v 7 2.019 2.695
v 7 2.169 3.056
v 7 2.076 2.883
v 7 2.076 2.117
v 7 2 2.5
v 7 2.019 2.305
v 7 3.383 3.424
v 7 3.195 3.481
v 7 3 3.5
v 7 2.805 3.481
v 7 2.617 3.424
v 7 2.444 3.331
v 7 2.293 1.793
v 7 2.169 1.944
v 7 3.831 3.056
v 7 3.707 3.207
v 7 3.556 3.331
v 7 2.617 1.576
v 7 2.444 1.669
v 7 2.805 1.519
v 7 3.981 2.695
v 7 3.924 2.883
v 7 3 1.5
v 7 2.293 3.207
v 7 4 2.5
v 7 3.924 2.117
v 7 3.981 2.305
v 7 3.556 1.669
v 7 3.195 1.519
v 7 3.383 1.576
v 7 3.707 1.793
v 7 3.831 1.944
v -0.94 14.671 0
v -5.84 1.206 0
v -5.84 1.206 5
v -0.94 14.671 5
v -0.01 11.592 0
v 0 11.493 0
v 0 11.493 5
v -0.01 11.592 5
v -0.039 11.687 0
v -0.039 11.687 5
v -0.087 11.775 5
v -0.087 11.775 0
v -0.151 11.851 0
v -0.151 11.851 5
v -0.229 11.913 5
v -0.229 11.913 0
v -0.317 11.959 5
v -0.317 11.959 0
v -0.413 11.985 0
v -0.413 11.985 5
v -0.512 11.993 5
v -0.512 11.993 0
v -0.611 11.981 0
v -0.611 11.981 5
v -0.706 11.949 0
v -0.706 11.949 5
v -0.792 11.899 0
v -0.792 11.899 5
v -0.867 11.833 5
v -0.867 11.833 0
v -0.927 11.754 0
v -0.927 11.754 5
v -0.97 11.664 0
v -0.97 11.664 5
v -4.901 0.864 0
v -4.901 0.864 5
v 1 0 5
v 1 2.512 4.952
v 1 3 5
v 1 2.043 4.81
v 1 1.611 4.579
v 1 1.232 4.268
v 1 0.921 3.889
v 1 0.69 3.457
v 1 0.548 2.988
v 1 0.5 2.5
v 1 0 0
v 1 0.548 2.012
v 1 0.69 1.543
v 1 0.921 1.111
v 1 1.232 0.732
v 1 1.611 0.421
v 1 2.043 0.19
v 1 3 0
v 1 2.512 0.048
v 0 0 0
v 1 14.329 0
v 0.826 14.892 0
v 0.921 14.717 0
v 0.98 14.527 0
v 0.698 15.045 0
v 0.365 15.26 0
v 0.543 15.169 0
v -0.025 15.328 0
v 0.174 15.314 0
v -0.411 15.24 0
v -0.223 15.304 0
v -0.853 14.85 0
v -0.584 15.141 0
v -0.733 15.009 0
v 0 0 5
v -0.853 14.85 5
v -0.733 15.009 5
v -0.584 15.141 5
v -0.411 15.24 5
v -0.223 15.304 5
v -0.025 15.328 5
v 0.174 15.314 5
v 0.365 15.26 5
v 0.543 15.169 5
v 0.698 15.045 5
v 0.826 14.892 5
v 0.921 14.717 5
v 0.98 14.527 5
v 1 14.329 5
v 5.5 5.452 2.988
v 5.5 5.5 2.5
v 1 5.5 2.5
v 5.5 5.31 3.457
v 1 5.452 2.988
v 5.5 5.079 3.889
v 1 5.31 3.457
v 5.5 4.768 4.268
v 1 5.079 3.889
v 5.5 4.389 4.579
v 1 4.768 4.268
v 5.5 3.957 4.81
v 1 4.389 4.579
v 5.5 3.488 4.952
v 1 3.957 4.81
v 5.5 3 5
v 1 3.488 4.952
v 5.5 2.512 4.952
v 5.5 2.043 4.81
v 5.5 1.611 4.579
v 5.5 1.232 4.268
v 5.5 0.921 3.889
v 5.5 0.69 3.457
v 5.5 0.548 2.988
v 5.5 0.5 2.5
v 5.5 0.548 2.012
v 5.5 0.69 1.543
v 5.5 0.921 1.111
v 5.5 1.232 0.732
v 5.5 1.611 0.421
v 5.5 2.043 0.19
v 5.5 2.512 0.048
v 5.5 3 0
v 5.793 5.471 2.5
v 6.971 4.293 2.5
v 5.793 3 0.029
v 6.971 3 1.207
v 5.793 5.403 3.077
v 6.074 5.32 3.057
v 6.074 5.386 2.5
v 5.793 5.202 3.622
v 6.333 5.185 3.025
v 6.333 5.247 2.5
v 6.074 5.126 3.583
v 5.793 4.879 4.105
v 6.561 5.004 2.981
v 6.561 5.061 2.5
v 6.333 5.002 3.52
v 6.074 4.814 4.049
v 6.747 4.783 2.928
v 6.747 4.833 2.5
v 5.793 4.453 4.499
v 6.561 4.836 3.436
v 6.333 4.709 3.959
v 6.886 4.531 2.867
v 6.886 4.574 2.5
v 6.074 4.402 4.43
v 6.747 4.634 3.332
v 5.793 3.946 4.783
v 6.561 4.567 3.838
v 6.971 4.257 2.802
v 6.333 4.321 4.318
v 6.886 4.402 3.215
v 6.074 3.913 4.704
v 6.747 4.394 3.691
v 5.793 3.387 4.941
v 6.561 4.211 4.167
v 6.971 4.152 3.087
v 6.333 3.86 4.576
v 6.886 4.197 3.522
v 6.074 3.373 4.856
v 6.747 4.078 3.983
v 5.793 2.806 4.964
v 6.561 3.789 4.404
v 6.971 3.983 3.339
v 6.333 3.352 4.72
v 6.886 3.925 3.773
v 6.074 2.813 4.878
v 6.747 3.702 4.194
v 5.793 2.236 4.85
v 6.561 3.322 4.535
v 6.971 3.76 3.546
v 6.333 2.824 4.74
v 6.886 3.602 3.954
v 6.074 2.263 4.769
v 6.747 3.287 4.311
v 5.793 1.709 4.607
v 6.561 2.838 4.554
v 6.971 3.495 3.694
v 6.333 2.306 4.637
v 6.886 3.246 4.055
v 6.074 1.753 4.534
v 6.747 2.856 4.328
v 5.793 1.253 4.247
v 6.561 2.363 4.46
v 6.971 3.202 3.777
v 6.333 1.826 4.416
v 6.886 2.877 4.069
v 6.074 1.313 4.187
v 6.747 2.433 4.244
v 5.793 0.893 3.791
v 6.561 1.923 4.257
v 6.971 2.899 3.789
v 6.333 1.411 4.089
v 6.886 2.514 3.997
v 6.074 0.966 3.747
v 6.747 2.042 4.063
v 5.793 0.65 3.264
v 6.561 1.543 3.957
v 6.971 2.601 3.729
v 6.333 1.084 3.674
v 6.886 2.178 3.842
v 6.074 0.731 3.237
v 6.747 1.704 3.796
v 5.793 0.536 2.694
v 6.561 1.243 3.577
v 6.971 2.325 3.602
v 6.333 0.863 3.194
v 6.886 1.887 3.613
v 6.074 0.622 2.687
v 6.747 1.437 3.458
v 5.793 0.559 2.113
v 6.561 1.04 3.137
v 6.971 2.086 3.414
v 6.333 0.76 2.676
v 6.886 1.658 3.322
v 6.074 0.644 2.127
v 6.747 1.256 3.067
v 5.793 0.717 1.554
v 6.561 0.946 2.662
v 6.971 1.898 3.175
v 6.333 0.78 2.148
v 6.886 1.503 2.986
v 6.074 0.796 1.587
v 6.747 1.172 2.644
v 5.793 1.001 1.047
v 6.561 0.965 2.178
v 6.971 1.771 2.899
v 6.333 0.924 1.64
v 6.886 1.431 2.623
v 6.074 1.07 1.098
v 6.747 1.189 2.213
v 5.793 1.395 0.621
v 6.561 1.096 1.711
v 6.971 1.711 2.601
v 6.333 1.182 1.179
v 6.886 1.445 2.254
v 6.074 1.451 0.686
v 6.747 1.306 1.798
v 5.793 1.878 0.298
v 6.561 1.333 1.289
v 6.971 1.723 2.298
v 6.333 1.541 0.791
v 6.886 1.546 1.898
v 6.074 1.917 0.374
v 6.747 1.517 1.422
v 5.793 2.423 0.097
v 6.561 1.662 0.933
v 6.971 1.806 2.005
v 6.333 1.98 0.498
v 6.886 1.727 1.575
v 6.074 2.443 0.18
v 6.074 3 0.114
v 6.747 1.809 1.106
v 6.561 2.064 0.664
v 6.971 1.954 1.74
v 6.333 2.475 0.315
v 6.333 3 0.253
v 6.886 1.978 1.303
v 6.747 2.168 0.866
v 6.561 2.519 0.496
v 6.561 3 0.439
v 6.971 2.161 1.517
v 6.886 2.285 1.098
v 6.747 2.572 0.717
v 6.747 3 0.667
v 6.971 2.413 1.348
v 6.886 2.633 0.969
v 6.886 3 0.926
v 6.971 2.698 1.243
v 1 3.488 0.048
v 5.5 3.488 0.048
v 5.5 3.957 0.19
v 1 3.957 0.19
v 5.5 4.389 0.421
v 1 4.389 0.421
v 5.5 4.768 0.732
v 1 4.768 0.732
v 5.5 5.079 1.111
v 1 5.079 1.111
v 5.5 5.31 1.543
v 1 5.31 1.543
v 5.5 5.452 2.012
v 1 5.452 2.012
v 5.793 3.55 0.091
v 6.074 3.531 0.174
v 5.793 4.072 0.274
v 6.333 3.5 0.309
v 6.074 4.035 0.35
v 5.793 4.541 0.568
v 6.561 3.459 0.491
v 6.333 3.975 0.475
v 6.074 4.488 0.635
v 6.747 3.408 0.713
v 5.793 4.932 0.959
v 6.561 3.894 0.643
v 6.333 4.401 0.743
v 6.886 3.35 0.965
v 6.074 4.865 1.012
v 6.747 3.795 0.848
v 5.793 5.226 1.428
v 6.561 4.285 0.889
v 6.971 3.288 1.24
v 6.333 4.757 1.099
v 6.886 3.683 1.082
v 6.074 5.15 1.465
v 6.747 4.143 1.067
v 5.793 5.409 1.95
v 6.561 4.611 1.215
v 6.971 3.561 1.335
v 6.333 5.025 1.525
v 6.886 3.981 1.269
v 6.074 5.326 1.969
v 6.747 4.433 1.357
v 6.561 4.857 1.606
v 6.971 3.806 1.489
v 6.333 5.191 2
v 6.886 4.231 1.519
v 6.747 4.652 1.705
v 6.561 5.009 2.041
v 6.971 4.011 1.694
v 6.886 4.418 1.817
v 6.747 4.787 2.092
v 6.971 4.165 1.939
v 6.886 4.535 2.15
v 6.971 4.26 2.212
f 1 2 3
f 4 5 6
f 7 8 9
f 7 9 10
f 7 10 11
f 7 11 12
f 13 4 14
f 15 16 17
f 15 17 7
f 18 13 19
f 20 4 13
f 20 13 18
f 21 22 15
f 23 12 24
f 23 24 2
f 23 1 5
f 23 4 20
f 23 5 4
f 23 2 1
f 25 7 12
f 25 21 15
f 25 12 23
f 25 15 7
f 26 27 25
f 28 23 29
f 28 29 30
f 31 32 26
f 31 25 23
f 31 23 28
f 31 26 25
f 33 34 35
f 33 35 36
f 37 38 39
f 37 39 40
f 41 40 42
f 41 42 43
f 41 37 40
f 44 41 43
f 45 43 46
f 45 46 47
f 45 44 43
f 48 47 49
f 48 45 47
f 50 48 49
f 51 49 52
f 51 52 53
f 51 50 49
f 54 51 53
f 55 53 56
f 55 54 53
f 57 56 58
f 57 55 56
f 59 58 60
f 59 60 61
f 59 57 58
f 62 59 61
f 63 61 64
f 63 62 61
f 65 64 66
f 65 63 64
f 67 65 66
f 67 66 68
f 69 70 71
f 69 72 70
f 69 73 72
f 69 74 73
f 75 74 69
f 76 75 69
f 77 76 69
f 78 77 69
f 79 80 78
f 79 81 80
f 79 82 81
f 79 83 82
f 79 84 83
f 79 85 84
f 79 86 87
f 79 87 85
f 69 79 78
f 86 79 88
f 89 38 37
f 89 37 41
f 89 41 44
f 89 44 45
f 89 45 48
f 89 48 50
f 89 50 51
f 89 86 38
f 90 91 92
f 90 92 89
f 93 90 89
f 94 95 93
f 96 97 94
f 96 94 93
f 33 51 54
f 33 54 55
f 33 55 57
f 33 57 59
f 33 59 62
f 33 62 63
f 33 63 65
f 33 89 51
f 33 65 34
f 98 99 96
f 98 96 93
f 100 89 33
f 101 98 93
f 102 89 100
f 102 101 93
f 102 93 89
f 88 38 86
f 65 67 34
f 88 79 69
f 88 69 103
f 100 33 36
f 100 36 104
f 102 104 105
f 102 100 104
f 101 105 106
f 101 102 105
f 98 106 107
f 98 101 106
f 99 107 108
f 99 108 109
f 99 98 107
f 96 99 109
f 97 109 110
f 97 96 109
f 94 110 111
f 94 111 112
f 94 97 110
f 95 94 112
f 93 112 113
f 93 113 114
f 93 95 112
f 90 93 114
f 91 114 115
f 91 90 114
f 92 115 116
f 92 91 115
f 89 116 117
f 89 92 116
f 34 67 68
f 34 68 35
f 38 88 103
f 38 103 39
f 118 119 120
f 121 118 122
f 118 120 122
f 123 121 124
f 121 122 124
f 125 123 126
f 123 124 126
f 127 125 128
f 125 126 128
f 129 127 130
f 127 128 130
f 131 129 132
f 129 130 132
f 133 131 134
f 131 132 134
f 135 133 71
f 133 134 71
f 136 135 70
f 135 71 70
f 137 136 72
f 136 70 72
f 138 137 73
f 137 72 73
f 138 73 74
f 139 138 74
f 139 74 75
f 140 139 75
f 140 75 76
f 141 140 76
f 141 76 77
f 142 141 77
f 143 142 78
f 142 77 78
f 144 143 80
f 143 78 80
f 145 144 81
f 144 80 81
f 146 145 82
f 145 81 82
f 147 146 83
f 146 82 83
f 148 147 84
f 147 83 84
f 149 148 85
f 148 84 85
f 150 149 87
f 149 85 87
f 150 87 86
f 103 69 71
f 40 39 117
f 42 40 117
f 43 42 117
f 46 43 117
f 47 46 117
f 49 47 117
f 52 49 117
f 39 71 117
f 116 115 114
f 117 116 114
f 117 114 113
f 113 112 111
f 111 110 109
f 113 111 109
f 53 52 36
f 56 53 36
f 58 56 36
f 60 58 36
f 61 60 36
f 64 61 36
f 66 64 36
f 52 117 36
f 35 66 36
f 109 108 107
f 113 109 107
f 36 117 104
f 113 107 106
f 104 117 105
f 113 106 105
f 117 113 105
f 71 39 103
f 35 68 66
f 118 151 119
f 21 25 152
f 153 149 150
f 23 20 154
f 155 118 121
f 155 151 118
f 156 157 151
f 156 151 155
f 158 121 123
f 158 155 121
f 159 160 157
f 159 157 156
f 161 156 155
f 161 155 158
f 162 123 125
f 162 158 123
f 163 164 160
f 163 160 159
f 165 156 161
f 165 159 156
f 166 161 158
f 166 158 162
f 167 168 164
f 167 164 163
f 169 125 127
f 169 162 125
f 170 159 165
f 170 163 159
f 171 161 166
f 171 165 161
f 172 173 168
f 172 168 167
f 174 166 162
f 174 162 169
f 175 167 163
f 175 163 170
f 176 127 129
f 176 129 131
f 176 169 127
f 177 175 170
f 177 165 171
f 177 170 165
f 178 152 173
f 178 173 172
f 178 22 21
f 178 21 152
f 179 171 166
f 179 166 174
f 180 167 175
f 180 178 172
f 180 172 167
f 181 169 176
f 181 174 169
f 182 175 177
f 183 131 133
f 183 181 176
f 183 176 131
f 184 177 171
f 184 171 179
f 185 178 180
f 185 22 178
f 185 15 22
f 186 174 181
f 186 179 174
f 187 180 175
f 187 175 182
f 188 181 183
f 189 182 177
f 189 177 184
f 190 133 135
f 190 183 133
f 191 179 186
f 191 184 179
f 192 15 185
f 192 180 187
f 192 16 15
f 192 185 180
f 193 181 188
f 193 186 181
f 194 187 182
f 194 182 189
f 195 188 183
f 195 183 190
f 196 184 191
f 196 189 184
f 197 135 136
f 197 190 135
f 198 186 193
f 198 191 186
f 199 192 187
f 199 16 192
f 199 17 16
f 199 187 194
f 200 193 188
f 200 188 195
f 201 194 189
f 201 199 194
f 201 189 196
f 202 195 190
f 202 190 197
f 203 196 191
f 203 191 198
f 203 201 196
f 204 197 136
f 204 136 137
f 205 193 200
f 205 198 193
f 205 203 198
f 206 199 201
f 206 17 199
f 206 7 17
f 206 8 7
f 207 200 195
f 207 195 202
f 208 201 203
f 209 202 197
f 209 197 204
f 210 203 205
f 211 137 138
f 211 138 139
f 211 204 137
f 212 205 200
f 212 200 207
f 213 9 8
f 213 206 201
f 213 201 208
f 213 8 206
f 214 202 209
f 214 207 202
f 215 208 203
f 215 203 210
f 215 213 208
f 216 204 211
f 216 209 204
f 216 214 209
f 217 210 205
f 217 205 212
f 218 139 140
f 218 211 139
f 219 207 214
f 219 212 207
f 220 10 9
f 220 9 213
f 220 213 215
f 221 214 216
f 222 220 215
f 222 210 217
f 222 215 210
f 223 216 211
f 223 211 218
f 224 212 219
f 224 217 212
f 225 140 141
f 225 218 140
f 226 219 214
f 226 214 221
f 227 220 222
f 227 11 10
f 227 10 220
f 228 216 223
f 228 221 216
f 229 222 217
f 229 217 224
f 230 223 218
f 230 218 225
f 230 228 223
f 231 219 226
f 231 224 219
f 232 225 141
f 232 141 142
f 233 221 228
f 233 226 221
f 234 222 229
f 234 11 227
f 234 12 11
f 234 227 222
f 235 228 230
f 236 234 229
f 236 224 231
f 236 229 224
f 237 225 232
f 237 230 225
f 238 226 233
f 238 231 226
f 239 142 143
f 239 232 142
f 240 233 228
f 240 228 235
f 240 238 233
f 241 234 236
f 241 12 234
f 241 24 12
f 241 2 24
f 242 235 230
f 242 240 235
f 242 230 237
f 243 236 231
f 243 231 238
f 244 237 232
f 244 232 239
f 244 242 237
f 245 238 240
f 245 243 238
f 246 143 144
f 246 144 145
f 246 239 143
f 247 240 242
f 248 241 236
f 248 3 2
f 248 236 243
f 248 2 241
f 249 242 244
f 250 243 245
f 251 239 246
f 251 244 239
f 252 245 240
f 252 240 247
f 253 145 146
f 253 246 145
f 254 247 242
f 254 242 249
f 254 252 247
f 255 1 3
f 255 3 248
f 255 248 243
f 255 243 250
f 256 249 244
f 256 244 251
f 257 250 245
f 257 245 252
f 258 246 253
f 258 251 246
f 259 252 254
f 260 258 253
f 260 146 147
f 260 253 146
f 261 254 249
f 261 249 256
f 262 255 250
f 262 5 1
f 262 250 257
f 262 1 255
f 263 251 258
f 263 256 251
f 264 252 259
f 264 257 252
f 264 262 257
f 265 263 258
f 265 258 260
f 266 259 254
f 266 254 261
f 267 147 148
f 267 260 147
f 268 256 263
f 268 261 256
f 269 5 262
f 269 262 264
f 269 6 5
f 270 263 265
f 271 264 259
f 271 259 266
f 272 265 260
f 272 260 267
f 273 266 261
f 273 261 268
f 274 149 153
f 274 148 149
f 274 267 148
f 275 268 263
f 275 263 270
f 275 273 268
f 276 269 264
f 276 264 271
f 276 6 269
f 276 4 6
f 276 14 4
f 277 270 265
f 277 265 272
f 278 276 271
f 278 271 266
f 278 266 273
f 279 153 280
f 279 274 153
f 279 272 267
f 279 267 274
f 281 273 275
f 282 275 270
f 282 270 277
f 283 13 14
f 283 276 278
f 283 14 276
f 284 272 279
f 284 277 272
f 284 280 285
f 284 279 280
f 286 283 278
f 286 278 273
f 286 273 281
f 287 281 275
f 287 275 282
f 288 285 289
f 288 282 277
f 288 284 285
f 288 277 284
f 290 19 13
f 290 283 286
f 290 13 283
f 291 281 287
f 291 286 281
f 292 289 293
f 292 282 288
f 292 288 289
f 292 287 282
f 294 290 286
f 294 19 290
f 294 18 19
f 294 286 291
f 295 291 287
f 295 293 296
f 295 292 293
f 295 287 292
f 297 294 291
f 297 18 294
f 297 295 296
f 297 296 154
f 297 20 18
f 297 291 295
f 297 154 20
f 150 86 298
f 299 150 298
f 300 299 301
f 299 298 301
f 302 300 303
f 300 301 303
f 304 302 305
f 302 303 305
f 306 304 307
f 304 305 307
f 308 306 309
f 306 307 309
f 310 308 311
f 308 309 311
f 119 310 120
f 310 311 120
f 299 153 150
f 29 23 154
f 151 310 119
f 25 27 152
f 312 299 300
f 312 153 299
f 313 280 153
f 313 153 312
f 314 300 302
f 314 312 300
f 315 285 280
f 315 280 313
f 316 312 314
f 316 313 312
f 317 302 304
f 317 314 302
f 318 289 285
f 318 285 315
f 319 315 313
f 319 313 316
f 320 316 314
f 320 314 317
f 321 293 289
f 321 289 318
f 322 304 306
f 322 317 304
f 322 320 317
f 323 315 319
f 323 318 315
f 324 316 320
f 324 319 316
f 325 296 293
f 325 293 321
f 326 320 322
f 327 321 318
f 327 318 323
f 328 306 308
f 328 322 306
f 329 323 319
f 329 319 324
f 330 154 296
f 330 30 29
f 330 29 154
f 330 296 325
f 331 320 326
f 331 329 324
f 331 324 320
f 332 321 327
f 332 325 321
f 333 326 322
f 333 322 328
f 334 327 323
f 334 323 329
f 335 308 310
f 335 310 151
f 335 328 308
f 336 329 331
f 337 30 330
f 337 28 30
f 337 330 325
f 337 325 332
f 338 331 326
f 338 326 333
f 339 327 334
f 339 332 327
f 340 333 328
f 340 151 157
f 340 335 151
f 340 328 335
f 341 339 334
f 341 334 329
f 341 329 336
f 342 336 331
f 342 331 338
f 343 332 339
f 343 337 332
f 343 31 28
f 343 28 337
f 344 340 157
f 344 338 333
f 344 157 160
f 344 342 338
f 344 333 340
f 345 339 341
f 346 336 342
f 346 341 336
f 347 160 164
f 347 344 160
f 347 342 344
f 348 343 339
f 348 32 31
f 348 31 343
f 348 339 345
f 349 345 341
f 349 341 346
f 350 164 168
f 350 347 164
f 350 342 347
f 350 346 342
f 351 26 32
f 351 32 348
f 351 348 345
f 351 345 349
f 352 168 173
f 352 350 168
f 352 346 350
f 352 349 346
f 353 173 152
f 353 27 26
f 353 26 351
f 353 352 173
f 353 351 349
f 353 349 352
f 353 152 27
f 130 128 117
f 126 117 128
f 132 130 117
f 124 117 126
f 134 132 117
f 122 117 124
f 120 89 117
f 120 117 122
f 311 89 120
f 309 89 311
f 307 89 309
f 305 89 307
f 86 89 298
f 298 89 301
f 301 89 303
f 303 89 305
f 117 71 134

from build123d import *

# Parameters (mm, degrees)
BOSS_EXTRUDE1_DEPTH = 5
BOSS_EXTRUDE2_DEPTH = 6
FILLET1_R           = 1.5


with BuildPart() as part:
    # Sketch1 → Boss-Extrude1 (new body)
    with BuildSketch(Plane.XY):
        with BuildLine():
            Line((0, 0), (0, 11.493077271))
            ThreePointArc((0, 11.493077271), (-0.413175911, 11.985481147), (-0.96984631, 11.664087342))
            Line((-0.96984631, 11.664087342), (-4.900710246, 0.864127441))
            Line((-4.900710246, 0.864127441), (-5.840402867, 1.206147584))
            Line((-5.840402867, 1.206147584), (-0.939692621, 14.670738324))
            ThreePointArc((-0.939692621, 14.670738324), (0.173648178, 15.313525933), (1, 14.32871818))
            Line((1, 14.32871818), (1, 0))
            Line((1, 0), (0, 0))
        make_face()
    extrude(amount=BOSS_EXTRUDE1_DEPTH)

    # Sketch2 → Boss-Extrude2 (add)
    with BuildSketch(Plane(origin=(1, 0, 0), x_dir=(0, 0, -1), z_dir=(1, 0, 0))):
        with BuildLine():
            ThreePointArc((-2.5, 5.5), (-4.267766953, 1.232233047), (0, 3))
            ThreePointArc((0, 3), (-0.732233047, 4.767766953), (-2.5, 5.5))
        make_face()
    extrude(amount=BOSS_EXTRUDE2_DEPTH)

    # Fillet1
    fillet1_edges = [part.edges().sort_by_distance(p)[0] for p in [
        (7, 3, 5),
    ]]
    fillet(fillet1_edges, radius=FILLET1_R)


solid = part.part
